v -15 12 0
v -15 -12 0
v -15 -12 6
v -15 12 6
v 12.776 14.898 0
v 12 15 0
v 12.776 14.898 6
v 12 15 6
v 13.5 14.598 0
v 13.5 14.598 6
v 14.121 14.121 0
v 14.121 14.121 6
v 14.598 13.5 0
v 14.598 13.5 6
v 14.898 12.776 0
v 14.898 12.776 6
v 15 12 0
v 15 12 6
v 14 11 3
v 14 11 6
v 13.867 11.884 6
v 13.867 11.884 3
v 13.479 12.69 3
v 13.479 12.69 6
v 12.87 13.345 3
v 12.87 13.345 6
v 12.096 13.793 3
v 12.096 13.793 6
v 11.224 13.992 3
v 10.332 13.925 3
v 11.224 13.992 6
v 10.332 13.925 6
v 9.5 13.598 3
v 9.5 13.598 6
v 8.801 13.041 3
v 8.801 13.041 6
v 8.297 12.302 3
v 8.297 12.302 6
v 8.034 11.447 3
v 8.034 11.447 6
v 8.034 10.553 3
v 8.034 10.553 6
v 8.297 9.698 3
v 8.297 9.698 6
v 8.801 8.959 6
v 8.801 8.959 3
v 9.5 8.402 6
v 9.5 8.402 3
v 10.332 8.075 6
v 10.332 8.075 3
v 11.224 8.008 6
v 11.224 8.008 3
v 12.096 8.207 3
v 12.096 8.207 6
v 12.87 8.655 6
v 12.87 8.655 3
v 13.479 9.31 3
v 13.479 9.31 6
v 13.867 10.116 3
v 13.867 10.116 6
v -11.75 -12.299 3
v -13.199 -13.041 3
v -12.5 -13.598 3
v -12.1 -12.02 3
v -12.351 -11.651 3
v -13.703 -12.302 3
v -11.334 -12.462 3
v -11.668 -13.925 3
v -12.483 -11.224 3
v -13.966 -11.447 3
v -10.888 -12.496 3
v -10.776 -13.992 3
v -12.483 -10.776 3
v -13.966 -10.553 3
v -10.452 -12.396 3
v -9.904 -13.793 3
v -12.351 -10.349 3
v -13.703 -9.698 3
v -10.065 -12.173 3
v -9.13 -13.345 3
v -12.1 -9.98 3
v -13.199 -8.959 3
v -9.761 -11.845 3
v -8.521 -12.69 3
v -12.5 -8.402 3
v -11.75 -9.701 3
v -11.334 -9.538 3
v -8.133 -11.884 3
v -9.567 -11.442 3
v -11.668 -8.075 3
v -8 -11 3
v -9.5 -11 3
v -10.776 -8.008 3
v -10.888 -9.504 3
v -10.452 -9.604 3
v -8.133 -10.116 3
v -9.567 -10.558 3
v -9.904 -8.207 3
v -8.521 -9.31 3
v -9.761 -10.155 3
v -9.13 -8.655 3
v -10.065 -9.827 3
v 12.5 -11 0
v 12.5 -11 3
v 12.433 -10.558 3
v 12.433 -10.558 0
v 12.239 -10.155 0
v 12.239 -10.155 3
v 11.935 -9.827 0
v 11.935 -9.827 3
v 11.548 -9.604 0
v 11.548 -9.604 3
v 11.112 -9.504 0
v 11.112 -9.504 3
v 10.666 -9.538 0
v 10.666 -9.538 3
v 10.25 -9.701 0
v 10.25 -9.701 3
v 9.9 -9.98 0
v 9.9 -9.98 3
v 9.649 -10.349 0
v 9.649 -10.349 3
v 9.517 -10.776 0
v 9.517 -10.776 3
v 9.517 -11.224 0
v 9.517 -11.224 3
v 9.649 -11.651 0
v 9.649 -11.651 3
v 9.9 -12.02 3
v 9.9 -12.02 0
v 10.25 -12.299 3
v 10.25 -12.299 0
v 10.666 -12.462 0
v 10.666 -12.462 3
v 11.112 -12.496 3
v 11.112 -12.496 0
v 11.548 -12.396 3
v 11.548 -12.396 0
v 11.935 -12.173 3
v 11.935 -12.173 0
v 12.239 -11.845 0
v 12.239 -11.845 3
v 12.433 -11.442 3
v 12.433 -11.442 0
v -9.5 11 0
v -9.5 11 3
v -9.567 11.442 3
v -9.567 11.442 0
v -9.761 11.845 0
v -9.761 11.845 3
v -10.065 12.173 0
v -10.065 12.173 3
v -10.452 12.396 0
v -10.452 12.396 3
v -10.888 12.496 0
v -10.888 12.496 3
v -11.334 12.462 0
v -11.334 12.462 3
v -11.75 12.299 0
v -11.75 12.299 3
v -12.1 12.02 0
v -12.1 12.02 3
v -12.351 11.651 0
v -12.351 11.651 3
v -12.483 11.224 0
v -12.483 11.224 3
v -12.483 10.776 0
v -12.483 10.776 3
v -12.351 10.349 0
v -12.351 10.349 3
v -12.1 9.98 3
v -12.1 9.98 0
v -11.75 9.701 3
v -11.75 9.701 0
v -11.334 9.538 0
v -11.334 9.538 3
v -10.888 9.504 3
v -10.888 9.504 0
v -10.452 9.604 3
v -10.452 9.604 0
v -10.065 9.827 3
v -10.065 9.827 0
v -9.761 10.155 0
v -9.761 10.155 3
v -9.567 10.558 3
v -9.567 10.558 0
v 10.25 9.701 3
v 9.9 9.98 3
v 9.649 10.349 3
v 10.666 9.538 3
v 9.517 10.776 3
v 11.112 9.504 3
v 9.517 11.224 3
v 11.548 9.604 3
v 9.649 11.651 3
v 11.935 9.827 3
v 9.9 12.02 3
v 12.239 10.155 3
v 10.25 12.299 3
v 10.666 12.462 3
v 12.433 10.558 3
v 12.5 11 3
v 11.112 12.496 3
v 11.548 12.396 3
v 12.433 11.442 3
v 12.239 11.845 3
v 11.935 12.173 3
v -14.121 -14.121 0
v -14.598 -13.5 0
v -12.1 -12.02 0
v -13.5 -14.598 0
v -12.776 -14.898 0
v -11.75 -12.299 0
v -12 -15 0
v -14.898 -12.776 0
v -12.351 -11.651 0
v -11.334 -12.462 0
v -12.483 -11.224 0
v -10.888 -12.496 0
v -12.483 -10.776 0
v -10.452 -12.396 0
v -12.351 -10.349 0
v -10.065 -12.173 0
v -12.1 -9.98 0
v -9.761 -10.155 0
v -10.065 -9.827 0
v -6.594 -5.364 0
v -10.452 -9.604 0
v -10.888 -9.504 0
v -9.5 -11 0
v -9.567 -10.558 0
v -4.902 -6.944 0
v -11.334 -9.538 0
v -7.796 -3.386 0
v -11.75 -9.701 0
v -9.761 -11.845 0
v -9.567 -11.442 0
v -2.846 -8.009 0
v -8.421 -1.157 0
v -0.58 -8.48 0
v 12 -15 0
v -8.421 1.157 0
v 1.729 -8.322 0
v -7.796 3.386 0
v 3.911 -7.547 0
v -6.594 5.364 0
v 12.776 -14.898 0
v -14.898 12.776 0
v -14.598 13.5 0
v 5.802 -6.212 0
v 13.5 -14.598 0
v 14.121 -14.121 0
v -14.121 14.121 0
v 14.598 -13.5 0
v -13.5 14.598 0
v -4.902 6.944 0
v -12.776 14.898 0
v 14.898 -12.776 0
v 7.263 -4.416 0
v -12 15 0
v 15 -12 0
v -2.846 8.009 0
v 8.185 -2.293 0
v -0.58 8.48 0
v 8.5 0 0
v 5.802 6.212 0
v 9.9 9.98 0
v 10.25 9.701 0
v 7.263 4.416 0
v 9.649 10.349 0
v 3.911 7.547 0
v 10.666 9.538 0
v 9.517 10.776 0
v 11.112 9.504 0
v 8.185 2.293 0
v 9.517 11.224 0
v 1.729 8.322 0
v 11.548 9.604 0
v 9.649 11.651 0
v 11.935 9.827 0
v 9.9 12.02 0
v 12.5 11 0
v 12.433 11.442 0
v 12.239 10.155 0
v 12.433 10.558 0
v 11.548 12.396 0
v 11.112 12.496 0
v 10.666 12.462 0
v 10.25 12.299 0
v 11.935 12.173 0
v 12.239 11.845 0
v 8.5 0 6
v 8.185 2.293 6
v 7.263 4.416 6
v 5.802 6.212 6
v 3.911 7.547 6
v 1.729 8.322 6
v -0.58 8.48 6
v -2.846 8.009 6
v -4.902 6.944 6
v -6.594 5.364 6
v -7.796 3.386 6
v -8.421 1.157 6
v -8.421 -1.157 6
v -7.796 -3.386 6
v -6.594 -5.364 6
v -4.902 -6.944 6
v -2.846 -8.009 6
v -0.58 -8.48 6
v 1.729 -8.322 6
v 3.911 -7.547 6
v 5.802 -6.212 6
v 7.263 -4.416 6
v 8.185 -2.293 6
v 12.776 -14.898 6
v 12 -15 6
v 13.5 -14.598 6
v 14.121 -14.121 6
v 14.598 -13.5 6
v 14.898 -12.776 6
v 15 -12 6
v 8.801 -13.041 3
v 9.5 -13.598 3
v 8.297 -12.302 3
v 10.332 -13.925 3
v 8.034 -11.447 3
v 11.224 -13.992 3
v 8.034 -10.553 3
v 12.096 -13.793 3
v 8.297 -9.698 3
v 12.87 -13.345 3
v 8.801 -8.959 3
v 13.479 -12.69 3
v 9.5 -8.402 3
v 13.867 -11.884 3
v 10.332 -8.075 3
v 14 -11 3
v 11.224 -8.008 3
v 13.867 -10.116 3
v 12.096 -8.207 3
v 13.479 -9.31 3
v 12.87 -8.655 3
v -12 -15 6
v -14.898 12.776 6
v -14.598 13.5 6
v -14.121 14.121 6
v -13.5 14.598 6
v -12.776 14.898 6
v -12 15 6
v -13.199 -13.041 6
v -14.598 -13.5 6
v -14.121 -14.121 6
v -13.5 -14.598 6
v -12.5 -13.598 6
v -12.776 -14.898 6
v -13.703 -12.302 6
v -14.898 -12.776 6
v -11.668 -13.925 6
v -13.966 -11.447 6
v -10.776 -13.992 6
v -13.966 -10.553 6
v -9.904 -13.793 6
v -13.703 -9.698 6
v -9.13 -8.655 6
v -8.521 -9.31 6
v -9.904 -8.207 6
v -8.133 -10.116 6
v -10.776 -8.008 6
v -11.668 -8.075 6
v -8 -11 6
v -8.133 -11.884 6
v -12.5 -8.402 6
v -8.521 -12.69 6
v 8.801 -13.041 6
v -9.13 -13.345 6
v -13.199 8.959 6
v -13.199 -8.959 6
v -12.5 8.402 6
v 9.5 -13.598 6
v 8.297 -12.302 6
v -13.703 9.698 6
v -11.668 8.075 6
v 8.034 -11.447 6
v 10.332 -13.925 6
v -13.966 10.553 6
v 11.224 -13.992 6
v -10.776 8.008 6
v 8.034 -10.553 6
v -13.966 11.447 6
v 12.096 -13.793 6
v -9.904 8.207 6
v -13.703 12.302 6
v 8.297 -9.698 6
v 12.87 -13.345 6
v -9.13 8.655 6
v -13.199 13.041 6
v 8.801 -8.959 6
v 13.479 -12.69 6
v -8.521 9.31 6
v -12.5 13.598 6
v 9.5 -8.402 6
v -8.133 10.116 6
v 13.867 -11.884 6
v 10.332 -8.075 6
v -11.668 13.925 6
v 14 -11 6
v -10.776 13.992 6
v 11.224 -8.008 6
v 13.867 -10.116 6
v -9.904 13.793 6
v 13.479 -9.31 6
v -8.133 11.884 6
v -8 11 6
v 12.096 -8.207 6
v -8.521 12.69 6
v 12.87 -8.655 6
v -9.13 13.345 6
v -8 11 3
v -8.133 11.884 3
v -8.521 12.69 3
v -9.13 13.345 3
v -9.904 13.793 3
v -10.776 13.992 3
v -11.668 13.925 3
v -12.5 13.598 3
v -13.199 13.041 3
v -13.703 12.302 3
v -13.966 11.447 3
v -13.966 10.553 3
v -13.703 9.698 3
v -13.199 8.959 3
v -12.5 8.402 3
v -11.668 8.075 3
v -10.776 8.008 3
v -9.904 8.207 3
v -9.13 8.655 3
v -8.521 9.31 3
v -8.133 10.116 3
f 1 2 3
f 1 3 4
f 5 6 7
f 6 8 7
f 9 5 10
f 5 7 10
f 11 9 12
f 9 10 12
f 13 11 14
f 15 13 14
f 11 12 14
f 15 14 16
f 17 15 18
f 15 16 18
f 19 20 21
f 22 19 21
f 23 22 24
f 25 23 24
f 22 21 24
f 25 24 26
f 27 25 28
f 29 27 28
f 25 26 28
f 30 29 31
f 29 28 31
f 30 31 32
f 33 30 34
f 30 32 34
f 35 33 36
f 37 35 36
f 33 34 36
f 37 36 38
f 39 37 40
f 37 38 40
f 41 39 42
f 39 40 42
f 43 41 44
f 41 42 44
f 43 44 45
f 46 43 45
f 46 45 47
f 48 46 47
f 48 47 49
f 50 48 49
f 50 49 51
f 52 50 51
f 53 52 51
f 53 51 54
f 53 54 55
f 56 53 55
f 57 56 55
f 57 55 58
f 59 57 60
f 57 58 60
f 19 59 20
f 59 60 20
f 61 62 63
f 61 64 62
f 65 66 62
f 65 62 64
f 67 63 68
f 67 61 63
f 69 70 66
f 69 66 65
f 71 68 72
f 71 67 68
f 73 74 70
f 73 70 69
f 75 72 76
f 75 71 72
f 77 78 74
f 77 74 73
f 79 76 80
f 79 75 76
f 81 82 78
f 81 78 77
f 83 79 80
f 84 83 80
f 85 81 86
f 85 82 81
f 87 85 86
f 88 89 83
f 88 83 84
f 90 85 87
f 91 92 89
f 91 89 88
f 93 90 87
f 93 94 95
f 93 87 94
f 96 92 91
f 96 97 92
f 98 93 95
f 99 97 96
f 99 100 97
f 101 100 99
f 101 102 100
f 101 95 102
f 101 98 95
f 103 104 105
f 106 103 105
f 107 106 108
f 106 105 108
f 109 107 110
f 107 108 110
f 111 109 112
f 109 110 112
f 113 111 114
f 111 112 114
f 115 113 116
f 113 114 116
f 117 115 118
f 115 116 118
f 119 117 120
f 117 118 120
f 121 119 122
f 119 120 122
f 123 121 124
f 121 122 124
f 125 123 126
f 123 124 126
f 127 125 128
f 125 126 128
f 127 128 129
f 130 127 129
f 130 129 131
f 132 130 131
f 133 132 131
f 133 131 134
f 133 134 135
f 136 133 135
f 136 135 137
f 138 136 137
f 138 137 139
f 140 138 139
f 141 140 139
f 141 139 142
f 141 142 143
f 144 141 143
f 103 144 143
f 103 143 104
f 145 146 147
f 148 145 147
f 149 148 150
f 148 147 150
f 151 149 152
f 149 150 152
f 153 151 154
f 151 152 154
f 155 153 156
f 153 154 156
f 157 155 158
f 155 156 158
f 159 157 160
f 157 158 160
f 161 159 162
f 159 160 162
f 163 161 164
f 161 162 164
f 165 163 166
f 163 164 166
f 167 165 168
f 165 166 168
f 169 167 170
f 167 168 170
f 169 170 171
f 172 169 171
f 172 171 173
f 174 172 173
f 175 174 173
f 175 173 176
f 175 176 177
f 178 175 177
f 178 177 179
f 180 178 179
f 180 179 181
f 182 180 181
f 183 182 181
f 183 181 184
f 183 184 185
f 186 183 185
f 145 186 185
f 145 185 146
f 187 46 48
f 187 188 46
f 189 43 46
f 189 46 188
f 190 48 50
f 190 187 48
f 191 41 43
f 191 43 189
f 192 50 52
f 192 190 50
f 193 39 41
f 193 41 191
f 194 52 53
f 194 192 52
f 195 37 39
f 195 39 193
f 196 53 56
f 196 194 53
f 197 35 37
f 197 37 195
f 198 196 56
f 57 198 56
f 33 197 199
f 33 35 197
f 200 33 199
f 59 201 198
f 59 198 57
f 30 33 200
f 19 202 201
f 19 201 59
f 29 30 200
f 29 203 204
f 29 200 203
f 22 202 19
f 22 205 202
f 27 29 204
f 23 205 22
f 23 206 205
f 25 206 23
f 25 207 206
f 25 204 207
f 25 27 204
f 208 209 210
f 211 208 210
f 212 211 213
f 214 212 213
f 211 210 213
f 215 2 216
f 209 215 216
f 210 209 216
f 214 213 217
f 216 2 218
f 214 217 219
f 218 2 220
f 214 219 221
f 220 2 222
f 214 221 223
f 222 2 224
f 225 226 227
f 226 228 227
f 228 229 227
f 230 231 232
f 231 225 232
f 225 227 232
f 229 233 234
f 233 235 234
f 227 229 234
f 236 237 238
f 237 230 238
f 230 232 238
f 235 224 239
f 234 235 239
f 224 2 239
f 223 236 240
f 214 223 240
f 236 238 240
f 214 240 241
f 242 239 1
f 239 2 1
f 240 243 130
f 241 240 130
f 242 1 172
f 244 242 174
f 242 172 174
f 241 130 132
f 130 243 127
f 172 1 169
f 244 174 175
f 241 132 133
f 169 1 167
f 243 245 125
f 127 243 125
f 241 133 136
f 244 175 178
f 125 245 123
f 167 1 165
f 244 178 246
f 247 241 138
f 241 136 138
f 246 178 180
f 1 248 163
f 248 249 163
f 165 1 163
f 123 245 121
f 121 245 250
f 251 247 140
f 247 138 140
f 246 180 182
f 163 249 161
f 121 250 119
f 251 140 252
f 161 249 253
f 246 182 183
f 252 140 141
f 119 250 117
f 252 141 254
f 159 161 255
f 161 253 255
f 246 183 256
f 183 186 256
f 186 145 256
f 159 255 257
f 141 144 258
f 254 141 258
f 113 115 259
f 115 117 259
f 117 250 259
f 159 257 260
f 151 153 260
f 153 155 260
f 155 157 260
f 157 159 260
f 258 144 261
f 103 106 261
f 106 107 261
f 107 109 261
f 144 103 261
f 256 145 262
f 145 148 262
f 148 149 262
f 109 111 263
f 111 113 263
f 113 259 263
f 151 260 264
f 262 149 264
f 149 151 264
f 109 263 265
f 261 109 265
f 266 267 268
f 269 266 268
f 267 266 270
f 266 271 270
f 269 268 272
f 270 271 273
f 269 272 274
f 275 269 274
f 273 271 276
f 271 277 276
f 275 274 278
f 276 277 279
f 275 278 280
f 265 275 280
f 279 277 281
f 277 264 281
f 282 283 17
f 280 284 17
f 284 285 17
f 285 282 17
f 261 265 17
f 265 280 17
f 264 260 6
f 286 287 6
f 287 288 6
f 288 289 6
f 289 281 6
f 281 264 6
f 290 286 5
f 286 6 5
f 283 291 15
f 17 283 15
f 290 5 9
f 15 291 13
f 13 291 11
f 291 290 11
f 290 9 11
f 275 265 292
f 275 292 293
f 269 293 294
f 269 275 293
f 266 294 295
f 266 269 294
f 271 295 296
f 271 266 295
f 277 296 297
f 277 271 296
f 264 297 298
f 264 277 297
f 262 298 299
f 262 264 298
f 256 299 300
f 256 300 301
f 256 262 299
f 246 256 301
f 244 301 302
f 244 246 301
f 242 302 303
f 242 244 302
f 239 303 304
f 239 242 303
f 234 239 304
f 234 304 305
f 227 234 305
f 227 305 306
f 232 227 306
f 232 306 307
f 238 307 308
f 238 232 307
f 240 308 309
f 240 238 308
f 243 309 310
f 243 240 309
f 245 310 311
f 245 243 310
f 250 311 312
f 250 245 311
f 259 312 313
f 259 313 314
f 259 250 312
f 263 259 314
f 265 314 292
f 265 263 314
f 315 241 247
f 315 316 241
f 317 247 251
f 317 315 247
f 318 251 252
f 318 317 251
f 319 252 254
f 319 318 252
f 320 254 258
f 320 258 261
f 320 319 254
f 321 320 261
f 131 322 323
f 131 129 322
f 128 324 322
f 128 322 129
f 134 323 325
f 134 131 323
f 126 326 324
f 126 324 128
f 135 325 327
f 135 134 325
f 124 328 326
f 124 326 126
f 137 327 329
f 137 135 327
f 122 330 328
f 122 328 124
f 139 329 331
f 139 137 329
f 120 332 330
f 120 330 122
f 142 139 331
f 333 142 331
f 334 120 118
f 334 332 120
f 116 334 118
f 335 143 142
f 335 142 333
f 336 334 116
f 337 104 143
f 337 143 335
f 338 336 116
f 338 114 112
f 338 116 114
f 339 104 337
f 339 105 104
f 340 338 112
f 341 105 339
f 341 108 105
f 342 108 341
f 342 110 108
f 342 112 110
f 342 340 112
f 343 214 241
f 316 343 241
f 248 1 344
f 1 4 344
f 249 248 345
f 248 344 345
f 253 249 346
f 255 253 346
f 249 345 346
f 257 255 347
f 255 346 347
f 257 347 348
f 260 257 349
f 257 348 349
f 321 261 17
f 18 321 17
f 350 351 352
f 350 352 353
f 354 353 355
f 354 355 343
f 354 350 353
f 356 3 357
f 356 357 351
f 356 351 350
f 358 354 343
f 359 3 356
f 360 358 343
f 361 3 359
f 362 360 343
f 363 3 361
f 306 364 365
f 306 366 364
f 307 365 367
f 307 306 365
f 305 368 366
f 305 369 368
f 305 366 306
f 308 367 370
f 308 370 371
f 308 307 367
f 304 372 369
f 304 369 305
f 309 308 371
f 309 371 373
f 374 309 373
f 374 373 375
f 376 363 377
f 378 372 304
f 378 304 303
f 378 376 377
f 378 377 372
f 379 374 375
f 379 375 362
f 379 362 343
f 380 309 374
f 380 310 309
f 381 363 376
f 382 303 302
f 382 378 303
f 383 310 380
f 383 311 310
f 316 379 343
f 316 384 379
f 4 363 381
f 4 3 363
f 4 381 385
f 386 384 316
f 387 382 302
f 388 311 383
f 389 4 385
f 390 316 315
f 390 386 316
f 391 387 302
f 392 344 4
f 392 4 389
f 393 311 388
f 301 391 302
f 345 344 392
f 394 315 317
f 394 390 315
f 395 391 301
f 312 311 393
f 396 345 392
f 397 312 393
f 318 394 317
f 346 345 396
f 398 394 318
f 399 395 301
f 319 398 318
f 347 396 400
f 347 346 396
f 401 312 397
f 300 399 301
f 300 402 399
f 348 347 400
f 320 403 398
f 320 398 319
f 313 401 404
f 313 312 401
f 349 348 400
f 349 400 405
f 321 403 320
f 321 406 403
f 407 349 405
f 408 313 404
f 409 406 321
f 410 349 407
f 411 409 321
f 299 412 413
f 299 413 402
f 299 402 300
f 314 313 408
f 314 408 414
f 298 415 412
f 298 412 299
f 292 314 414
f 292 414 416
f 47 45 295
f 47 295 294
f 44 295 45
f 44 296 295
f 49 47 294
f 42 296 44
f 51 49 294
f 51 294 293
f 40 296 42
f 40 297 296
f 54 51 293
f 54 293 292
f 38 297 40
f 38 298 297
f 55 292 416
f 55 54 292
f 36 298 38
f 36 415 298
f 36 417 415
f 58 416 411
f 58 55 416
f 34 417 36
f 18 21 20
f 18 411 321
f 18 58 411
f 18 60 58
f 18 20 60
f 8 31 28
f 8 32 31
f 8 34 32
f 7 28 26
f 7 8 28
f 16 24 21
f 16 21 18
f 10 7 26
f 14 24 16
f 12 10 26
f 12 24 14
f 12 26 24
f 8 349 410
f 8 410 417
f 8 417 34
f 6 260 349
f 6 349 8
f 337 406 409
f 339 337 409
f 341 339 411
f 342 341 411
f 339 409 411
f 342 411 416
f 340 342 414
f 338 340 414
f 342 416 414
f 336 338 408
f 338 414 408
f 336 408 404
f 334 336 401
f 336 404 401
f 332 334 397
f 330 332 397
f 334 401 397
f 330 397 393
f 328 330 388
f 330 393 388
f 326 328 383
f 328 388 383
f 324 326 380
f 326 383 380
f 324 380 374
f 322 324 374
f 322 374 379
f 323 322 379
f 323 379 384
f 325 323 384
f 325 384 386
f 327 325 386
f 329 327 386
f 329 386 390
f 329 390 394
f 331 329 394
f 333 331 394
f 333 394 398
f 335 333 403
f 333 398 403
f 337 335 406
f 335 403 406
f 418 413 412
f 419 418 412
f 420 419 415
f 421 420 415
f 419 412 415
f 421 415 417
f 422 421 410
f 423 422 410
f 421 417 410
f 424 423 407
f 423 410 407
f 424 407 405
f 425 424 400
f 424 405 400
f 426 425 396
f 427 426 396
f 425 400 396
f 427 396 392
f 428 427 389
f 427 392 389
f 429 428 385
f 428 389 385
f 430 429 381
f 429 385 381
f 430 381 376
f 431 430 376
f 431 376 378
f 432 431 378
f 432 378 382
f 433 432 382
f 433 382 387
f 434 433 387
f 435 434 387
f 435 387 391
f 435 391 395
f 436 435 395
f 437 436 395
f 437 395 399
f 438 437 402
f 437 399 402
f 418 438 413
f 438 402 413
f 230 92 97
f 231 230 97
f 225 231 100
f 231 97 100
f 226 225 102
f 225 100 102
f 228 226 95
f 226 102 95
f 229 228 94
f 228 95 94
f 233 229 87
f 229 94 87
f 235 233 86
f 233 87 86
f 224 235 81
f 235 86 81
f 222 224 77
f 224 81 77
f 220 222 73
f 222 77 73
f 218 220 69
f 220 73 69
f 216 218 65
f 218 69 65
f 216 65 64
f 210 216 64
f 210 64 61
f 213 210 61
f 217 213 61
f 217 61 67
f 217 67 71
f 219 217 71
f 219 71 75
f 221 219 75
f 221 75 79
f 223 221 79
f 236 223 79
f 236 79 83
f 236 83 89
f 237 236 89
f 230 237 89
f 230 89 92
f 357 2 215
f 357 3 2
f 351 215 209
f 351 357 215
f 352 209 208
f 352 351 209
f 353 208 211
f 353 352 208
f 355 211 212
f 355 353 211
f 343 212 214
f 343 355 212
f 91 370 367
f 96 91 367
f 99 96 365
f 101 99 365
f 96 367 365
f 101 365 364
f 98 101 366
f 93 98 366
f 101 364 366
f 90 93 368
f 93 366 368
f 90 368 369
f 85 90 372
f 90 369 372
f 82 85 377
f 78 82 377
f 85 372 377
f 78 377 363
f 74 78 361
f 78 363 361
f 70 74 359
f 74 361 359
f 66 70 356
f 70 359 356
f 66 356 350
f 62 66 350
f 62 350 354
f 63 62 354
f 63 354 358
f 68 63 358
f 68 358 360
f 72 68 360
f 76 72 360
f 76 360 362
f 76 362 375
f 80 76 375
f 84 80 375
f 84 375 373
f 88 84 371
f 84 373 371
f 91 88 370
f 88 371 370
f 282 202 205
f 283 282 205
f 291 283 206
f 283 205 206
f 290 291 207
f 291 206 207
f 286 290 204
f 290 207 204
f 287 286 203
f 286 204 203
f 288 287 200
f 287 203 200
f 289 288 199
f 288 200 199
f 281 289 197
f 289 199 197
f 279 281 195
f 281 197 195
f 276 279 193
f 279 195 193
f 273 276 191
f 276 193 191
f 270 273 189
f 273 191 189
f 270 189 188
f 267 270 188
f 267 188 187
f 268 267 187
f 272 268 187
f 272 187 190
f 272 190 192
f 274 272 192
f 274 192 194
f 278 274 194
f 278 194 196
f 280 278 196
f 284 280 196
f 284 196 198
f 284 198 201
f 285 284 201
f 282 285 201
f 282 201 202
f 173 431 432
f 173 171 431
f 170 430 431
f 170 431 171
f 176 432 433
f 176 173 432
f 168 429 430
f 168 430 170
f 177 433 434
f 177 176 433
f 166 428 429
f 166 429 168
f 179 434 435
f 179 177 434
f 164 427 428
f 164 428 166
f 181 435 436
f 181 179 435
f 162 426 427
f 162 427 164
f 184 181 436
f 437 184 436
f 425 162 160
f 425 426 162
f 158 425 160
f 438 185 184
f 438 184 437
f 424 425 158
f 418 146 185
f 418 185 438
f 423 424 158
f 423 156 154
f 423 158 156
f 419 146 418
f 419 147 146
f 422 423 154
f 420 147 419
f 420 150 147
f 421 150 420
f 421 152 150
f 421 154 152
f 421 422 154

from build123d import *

# Parameters (mm, degrees)
SKETCH1_W           = 30
SKETCH1_H           = 30
SKETCH1_R           = 8.5
BOSS_EXTRUDE1_DEPTH = 6
SKETCH3_R           = 1.5
CUT_EXTRUDE2_DEPTH  = 7
SKETCH4_R           = 3
CUT_EXTRUDE3_DEPTH  = 3
FILLET1_R           = 3


with BuildPart() as part:
    # Sketch1 → Boss-Extrude1 (new body)
    with BuildSketch(Plane.XY):
        Rectangle(SKETCH1_W, SKETCH1_H)
        Circle(SKETCH1_R, mode=Mode.SUBTRACT)
    extrude(amount=BOSS_EXTRUDE1_DEPTH)

    # Sketch3 → Cut-Extrude2 (cut, through all)
    with BuildSketch(Plane.XY.offset(6)):
        with Locations((-11, 11)):
            Circle(SKETCH3_R)
        with Locations((11, 11)):
            Circle(SKETCH3_R)
        with Locations((11, -11)):
            Circle(SKETCH3_R)
        with Locations((-11, -11)):
            Circle(SKETCH3_R)
    extrude(amount=-CUT_EXTRUDE2_DEPTH, mode=Mode.SUBTRACT)

    # Sketch4 → Cut-Extrude3 (cut)
    with BuildSketch(Plane.XY.offset(6)):
        with Locations((-11, 11)):
            Circle(SKETCH4_R)
        with Locations((11, 11)):
            Circle(SKETCH4_R)
        with Locations((11, -11)):
            Circle(SKETCH4_R)
        with Locations((-11, -11)):
            Circle(SKETCH4_R)
    extrude(amount=-CUT_EXTRUDE3_DEPTH, mode=Mode.SUBTRACT)

    # Fillet1
    fillet1_edges = [part.edges().sort_by_distance(p)[0] for p in [
        (15, -15, 3),
        (-15, -15, 3),
        (-15, 15, 3),
        (15, 15, 3),
    ]]
    fillet(fillet1_edges, radius=FILLET1_R)


solid = part.part
